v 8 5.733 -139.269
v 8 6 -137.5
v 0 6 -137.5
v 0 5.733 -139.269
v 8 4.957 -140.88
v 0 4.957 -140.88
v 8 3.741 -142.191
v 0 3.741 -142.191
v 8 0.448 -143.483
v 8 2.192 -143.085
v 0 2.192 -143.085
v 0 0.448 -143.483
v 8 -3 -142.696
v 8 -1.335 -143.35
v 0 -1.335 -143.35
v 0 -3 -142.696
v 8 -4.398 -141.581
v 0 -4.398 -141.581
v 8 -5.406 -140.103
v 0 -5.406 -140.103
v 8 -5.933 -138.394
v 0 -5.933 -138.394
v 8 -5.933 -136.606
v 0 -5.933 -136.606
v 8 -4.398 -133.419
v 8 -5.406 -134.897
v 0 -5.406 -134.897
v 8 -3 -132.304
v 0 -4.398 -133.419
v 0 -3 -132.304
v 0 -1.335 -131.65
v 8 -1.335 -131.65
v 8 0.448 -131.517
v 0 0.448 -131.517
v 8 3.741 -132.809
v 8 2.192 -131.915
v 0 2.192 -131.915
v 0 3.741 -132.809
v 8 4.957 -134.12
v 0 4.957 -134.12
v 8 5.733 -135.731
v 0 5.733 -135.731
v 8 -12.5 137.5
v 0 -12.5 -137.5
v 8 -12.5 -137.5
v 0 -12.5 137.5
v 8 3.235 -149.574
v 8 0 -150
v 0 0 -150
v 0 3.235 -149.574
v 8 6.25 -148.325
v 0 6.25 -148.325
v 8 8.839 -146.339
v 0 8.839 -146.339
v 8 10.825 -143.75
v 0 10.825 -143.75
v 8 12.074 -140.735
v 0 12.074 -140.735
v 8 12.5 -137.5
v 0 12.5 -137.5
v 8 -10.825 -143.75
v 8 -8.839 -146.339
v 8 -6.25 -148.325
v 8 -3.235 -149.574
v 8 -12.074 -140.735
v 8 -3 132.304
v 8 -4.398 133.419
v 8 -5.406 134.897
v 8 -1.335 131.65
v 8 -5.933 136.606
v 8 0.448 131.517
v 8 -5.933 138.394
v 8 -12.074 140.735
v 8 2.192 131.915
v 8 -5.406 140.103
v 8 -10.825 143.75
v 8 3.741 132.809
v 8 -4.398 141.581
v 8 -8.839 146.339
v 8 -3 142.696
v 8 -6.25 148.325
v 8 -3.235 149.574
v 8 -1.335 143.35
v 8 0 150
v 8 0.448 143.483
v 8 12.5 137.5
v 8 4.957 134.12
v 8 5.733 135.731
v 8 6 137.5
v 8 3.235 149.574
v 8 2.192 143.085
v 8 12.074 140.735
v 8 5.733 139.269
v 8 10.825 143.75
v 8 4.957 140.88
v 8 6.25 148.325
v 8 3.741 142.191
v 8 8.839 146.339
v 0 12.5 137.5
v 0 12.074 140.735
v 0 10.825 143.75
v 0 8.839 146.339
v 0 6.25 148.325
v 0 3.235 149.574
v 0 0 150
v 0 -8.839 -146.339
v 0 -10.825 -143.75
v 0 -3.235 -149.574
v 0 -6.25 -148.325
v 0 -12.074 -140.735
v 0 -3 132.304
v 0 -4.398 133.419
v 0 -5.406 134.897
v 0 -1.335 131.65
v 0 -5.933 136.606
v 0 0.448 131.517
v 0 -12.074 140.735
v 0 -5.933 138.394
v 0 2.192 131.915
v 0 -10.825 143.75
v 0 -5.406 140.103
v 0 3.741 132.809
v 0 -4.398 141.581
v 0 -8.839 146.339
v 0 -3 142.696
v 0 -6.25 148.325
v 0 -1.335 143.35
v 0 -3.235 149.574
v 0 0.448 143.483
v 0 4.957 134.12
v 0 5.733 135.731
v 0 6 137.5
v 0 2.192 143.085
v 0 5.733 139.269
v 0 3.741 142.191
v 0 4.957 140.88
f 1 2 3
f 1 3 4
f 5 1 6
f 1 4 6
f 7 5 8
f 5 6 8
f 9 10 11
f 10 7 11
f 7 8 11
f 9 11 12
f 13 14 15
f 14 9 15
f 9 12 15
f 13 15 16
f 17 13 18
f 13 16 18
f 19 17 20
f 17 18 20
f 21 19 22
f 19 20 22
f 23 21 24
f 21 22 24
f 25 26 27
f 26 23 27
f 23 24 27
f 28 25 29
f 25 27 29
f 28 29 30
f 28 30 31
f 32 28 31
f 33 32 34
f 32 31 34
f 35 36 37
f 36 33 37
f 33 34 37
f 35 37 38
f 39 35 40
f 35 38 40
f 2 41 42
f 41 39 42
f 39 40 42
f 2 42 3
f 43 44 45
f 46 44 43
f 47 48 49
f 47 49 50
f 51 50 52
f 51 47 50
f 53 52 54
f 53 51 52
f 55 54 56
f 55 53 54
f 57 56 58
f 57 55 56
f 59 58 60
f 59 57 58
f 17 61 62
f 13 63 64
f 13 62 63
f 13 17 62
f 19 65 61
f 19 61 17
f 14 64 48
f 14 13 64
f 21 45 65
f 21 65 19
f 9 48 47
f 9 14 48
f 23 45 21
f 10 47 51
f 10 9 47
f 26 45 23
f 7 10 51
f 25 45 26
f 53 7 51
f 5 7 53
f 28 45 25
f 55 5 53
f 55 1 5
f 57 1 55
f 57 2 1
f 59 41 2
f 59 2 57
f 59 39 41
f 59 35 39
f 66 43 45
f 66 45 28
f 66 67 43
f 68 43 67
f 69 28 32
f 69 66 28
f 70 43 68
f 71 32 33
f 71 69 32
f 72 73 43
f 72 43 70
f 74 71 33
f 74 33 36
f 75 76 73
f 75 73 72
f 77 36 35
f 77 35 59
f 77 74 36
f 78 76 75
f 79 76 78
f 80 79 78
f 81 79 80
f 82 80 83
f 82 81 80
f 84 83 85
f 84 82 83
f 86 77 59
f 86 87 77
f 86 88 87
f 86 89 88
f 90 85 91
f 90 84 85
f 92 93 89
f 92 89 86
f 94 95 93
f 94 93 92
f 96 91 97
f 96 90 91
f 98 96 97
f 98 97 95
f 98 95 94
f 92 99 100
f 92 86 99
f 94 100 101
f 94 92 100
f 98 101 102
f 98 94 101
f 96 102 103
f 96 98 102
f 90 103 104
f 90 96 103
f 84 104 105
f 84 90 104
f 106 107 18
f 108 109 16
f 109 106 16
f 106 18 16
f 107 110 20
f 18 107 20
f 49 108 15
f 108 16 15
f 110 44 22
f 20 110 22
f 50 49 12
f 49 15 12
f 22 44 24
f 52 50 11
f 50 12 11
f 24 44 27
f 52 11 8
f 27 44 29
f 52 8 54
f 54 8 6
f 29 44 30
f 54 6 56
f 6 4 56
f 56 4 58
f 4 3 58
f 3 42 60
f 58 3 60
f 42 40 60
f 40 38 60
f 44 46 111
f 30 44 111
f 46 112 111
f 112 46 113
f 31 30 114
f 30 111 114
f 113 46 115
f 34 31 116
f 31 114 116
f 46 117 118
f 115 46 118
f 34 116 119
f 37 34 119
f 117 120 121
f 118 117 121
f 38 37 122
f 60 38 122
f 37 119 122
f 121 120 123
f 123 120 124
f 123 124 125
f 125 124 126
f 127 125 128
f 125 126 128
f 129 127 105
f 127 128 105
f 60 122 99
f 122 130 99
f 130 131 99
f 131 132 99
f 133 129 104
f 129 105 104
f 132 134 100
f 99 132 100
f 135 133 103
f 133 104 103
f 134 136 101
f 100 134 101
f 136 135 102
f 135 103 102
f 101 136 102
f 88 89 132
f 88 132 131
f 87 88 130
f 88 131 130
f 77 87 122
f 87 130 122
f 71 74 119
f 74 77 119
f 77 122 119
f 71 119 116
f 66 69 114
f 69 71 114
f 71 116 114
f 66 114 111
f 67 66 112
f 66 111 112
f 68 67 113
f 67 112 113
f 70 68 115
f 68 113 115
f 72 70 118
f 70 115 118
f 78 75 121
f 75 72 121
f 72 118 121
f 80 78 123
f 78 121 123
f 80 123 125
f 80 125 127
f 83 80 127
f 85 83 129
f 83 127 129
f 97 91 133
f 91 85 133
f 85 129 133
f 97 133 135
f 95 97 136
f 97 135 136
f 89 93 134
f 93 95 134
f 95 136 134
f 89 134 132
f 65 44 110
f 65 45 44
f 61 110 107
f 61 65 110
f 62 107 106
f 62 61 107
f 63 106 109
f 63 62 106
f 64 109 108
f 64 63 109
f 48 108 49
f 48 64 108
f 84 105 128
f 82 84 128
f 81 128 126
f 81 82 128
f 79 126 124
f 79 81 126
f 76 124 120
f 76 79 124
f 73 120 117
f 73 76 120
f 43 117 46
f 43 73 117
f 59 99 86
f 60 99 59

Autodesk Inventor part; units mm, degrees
ref_plane "YZ Plane" through (0, 0, 0) normal (1, 0, 0) x (0, 1, 0)
ref_plane "XZ Plane" through (0, 0, 0) normal (0, 1, 0) x (-1, 0, 0)
ref_plane "XY Plane" through (0, 0, 0) normal (0, 0, 1) x (1, 0, 0)
sketch "Sketch1" plane through (0, 0, 0) normal (1, 0, 0) x (0, 1, 0)
  line L0 (12.5, 150) -> (12.5, -150)
  line L1 (12.5, -150) -> (-12.5, -150)
  line L2 (-12.5, -150) -> (-12.5, 150)
  line L3 (-12.5, 150) -> (12.5, 150)
  circle A0 centre (0, 137.5) radius 6
  circle A1 centre (0, -137.5) radius 6
  point P0 (0, 0)
  point P1 (-12.5, 56.5)
  point P2 (-12.5, 60.4432)
  dimension "d0" = 300
  dimension "d1" = 25
  dimension "d2" = 12.5
  dimension "d3" = 150
  dimension "d4" = 12
  dimension "d5" = 12.5
  dimension "d6" = 12
  dimension "d7" = 12.5
extrude "Extrusion1" add sketch "Sketch1" along normal blind 8
full round fillet "Full Round Fillet1" first side at (2.6667, 12.5, -50) centre faces at (2.6667, 4.1667, 150) second side at (2.6667, -12.5, 50)
full round fillet "Full Round Fillet2" first side at (5.3333, 12.5, -54.1666) centre faces at (2.6667, -4.1667, -150) second side at (5.3333, -12.5, 41.6667)
properties part number "Braço Macaco" material "Steel AISI 4142 380 QT"
